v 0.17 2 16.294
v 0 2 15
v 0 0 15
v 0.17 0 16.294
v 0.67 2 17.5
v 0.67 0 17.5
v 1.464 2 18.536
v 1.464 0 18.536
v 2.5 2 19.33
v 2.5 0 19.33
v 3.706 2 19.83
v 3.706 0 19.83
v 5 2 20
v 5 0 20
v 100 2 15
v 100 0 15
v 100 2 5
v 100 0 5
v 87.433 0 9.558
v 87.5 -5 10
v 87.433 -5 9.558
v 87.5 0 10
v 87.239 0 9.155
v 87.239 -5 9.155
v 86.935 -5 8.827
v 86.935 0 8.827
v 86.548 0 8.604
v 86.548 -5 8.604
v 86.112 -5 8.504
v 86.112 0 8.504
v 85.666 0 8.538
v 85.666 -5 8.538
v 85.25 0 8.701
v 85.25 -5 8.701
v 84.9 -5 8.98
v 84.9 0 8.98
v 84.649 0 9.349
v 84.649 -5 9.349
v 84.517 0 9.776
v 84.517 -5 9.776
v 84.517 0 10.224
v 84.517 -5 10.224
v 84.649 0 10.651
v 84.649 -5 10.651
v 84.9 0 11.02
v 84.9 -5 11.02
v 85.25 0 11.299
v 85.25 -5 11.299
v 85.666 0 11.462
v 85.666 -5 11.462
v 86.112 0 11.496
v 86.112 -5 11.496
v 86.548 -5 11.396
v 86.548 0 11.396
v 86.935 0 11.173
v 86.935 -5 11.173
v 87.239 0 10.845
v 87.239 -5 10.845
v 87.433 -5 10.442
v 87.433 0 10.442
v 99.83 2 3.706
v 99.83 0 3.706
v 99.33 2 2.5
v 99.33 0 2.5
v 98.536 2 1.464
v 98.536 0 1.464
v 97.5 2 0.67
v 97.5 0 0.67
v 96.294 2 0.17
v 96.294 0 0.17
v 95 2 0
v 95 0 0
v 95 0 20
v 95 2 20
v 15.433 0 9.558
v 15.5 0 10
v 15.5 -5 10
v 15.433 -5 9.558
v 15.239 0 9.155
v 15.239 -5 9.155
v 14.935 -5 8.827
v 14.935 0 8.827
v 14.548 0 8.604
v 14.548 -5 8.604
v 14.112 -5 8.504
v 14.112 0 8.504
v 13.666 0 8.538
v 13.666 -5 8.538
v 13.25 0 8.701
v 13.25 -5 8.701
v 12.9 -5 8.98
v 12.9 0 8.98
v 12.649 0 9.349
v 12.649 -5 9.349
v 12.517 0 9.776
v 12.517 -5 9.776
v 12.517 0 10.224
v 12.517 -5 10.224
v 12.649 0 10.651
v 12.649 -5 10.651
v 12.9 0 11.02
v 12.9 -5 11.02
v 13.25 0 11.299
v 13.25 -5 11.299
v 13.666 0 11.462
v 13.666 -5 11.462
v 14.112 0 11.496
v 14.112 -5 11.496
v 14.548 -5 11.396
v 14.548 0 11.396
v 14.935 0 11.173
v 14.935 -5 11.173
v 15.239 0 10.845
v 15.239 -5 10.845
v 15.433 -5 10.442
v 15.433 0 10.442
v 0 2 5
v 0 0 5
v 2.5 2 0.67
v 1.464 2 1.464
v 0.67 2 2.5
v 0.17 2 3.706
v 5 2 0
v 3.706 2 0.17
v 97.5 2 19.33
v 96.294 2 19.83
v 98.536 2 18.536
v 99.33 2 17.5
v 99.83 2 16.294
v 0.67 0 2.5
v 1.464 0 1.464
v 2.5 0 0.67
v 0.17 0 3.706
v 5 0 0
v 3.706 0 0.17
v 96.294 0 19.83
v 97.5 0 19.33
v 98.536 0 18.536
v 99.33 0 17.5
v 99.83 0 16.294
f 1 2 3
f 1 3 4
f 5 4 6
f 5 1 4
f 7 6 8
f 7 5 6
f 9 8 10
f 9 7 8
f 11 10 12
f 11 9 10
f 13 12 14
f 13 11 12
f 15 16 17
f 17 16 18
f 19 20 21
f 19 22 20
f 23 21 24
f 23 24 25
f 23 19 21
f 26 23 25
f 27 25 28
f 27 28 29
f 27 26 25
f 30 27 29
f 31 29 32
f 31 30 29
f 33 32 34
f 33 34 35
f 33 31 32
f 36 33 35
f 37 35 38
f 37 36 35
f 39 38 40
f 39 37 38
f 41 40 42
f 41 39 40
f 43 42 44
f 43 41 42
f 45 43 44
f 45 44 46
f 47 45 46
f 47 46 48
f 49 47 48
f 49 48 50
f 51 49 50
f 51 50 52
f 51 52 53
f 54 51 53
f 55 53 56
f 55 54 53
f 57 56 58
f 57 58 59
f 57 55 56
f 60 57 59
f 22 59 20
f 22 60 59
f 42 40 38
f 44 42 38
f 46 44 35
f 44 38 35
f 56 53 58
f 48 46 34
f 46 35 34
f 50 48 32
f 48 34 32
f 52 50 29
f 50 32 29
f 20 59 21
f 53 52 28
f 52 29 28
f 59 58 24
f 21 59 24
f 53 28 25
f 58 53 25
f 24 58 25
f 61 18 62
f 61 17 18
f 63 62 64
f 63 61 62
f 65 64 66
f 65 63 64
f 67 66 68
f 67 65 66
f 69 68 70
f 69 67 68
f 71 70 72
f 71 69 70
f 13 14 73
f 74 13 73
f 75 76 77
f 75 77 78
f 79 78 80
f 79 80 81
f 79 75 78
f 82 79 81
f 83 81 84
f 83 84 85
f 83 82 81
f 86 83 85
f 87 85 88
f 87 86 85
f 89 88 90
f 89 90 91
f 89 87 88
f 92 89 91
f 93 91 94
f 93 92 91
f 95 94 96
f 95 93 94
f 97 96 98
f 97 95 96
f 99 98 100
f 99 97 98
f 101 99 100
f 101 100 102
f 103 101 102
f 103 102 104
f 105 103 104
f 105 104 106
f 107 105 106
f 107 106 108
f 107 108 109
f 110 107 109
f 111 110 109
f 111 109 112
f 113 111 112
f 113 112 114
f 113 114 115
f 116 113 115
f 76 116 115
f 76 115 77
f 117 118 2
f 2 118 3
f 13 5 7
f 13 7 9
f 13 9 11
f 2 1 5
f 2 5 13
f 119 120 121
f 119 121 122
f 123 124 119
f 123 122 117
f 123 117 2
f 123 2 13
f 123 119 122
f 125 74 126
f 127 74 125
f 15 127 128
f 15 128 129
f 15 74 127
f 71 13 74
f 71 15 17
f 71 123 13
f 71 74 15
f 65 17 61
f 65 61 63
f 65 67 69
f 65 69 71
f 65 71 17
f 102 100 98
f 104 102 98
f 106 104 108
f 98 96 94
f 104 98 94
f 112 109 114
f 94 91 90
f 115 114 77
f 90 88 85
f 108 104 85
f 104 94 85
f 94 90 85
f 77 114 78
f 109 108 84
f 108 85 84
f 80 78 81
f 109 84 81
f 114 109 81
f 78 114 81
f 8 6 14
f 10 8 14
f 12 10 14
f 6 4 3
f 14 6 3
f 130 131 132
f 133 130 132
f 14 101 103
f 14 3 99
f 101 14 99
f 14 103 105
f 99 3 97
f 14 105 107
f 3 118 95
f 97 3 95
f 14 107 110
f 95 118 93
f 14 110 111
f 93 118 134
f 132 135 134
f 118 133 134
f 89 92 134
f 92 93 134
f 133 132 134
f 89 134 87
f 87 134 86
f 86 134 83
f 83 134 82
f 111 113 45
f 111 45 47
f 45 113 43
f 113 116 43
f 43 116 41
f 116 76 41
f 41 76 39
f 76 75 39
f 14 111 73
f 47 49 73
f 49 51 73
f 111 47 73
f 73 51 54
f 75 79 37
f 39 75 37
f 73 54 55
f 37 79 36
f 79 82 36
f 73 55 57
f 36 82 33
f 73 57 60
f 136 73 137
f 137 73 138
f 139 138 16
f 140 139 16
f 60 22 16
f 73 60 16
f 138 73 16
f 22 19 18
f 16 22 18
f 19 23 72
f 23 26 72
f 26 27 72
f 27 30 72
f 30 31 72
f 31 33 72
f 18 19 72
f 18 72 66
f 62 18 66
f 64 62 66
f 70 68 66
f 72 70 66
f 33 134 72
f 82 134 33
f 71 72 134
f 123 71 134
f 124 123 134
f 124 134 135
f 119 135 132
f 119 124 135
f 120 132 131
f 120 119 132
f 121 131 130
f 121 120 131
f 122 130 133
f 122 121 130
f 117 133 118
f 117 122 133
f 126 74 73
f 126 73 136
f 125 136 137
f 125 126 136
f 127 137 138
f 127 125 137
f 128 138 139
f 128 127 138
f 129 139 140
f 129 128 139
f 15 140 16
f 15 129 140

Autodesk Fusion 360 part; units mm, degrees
sketch "Sketch1" plane through (0, 0, 0) normal (0, 1, 0) x (1, 0, 0)
  line L0 (0, -20) -> (100, -20)
  line L1 (100, -20) -> (100, 0)
  line L2 (100, 0) -> (0, 0)
  line L3 (0, 0) -> (0, -20)
  dimension "d1" = 100
extrude "Extrude1" add sketch "Sketch1" along normal blind 2
sketch "Sketch2" plane through (0, 0, 0) normal (0, 1, 0) x (1, 0, 0)
  circle A0 centre (14, -10) radius 1.5
  dimension "d4" = 3
extrude "Extrude2" add sketch "Sketch2" against normal blind 5
sketch "Sketch3" plane through (0, 0, 0) normal (0, 1, 0) x (1, 0, 0)
  circle A0 centre (86, -10) radius 1.5
  dimension "d7" = 3
extrude "Extrude3" add sketch "Sketch3" against normal blind 5
fillet "Fillet1" radius 5 1 edges at (0, 1, 20)
fillet "Fillet2" radius 5 1 edges at (100, 1, 20)
fillet "Fillet3" radius 5 1 edges at (100, 1, 0)
fillet "Fillet4" radius 5 1 edges at (0, 1, 0)
